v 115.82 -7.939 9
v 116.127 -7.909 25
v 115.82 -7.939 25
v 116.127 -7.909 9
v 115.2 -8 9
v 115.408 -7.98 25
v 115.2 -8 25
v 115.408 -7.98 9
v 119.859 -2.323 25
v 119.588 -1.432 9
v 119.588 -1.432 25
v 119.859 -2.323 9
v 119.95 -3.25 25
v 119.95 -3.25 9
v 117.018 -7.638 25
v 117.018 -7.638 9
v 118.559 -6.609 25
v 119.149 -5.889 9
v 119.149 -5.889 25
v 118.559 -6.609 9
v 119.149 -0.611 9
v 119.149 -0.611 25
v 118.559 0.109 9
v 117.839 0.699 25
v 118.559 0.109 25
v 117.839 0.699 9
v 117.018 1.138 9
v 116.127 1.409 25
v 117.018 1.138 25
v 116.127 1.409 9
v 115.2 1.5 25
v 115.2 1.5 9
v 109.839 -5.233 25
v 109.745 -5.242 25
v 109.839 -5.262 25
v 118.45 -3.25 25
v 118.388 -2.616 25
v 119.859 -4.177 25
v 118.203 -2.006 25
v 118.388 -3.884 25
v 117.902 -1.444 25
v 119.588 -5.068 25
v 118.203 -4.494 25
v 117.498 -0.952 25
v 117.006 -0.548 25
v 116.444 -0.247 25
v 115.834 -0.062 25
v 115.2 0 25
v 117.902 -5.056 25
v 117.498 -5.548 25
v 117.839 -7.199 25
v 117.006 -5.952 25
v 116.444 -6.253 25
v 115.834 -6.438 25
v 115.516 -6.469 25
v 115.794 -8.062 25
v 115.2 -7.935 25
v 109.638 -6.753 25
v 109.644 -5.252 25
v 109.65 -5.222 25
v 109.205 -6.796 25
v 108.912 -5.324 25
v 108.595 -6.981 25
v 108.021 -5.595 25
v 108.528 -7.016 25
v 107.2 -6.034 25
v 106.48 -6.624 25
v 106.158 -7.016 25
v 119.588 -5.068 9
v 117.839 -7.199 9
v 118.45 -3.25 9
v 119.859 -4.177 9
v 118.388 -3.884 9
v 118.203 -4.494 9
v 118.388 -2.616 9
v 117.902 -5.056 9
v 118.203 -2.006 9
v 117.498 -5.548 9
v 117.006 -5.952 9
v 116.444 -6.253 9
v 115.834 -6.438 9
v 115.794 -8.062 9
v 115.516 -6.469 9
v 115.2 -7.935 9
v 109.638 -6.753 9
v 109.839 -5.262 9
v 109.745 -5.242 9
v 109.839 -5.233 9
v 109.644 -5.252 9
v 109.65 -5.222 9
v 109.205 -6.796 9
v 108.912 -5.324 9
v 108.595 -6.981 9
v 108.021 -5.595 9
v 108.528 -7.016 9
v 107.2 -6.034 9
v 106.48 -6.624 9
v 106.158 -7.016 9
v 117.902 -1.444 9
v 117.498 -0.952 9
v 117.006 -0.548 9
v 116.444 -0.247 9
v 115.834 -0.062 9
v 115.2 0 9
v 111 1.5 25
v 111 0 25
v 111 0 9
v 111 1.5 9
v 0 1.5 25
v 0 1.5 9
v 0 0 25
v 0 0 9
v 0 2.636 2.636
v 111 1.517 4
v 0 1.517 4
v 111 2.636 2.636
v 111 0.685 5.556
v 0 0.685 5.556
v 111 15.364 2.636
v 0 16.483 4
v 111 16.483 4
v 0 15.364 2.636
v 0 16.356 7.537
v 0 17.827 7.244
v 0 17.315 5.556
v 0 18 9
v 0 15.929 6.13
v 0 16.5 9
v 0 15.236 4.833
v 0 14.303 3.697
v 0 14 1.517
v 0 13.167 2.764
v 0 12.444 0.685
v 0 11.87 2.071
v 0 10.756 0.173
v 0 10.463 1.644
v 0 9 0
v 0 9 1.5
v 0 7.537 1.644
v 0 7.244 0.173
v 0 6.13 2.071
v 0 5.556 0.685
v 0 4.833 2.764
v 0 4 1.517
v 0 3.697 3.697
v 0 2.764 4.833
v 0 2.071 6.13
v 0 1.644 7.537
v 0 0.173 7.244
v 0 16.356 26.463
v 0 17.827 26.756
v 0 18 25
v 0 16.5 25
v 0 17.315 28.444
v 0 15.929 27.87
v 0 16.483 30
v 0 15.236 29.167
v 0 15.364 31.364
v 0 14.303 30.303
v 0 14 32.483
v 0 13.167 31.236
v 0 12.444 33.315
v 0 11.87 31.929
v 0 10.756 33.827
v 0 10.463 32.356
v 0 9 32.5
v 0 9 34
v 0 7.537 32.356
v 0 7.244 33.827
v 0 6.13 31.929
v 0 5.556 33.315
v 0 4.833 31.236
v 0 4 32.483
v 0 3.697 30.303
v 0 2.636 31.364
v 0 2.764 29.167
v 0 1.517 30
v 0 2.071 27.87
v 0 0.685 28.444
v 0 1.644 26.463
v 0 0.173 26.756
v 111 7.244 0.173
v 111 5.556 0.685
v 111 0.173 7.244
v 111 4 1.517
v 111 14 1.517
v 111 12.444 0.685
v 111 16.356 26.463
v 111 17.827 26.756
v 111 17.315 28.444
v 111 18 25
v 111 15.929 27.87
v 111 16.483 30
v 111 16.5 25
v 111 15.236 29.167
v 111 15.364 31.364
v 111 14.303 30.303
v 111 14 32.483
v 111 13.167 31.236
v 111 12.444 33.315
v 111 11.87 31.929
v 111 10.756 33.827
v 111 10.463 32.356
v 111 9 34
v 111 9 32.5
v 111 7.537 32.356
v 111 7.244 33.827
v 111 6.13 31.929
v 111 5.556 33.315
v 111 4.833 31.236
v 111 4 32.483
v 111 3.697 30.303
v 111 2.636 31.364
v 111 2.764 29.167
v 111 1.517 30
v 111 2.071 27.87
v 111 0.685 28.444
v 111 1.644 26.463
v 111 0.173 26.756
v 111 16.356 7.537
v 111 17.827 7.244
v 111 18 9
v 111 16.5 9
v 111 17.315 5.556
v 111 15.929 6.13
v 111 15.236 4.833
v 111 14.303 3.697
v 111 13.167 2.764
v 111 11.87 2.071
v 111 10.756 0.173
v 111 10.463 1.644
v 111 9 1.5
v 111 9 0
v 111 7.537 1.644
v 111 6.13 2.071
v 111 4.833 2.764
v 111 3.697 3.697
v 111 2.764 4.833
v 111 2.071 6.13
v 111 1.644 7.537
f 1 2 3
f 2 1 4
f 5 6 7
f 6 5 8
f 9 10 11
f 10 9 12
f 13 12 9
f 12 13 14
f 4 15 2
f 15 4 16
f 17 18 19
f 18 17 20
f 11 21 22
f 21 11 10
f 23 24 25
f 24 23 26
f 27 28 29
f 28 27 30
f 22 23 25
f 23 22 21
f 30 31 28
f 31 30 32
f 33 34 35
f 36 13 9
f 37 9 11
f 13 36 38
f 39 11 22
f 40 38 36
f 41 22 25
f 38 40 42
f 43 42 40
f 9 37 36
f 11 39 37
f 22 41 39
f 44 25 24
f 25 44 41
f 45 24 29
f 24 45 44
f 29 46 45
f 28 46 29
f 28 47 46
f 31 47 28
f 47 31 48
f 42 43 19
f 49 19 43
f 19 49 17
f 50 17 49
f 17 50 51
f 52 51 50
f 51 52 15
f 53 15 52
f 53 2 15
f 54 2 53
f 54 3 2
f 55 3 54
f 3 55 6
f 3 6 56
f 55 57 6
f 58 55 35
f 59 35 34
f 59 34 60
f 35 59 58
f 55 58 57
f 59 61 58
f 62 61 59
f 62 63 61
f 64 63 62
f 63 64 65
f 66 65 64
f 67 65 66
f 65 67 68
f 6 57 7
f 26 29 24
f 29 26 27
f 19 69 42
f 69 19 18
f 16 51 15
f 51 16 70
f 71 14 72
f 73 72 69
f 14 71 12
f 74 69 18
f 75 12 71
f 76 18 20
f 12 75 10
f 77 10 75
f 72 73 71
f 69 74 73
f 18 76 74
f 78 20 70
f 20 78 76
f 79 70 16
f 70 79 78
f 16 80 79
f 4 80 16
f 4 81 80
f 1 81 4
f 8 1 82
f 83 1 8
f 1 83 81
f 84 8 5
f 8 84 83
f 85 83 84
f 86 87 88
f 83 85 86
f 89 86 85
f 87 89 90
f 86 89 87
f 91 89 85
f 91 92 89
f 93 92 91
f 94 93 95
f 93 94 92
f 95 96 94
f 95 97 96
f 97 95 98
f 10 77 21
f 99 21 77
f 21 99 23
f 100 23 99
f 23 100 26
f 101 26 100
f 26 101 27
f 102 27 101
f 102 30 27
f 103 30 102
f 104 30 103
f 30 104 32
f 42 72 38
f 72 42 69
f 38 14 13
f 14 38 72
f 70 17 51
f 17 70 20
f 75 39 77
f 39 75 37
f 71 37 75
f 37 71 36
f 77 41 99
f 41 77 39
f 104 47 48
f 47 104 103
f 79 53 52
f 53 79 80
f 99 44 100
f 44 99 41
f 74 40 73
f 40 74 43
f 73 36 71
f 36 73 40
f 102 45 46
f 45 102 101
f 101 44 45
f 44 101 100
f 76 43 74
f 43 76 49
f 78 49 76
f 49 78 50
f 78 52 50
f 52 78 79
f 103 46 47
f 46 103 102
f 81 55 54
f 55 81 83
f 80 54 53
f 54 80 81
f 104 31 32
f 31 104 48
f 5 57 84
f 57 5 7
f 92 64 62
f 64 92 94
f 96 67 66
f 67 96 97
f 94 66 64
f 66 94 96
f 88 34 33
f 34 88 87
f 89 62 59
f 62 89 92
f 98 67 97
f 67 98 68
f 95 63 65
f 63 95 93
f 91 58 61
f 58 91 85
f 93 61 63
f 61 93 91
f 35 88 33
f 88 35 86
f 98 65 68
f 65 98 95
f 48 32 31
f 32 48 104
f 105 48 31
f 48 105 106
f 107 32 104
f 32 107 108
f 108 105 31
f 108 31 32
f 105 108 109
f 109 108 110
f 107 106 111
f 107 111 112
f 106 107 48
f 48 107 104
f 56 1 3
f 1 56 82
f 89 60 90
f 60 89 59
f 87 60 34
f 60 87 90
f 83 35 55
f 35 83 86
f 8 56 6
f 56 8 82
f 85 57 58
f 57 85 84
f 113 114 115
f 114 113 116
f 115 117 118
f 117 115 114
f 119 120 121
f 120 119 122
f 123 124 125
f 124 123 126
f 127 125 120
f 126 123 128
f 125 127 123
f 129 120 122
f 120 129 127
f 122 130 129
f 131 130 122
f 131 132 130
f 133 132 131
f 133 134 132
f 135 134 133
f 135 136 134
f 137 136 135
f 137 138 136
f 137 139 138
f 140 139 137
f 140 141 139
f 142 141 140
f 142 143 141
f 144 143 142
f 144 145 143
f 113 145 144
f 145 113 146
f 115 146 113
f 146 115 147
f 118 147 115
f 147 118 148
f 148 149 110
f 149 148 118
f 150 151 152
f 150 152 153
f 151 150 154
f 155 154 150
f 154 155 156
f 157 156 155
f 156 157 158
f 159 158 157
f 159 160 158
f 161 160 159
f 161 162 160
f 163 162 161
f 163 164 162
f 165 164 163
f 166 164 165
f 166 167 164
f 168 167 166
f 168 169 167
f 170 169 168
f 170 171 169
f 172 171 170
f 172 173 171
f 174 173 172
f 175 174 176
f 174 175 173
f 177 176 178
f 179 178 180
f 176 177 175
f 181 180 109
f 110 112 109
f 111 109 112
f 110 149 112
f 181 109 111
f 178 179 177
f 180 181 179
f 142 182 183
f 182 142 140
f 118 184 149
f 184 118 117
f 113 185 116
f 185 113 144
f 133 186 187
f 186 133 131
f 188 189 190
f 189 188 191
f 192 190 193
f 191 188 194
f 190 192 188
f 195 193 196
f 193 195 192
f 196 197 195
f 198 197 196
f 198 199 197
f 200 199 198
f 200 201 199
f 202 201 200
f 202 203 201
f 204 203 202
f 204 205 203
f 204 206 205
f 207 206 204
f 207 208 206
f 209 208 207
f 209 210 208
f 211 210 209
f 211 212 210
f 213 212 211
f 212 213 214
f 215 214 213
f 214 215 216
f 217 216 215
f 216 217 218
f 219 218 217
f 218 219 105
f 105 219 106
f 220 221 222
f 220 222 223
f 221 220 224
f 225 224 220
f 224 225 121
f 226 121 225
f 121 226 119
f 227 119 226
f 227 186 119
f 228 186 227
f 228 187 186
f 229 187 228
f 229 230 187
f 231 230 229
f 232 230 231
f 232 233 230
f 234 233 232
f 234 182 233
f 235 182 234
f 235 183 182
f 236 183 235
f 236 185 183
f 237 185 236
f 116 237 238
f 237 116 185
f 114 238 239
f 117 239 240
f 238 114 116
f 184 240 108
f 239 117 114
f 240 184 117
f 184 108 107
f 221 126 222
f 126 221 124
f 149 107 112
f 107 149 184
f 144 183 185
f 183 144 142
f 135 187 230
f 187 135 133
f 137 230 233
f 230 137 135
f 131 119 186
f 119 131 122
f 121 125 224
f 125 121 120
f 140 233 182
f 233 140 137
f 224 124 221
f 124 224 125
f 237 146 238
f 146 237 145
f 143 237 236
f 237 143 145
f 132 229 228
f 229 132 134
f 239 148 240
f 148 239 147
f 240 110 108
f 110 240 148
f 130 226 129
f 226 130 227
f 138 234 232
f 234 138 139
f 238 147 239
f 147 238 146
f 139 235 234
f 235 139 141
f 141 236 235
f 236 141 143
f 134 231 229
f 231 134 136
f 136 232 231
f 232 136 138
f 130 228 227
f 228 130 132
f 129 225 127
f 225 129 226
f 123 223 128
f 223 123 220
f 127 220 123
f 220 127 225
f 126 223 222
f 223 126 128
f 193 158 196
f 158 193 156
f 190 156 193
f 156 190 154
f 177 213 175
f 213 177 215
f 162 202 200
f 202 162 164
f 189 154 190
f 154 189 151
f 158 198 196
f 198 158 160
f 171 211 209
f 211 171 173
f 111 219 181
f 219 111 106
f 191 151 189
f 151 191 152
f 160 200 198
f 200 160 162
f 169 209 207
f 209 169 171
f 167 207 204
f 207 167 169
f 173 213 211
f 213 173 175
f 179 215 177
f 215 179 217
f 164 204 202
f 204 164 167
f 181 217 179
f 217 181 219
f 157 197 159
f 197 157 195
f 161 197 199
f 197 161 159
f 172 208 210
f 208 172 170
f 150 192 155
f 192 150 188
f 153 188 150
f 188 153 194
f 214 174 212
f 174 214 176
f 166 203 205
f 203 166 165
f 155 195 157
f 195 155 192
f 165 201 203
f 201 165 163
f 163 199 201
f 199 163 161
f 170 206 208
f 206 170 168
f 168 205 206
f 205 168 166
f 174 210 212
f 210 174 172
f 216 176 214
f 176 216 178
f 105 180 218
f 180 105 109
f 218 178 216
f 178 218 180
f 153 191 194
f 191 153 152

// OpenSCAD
module clip(opening=6.2, width=10, cliplen=6.6, thickness=1.5) {
    union() {
        // back piece
        translate([-cliplen, 0, 0])
        cube([cliplen*3, thickness, width]);
        // curve at back
        translate([cliplen*2, -opening/2, width/2]) {
            difference() {
                cylinder(h=width, d=opening+2*thickness, center=true, $fn=32);
                cylinder(h=width, d=opening, center=true, $fn=32);
                translate([-cliplen/2, 0, 0])
                cube([cliplen, opening+2*thickness, width], center=true);
            }
        }
        // front
        rot_angle = 12;
        offset_x = cos(rot_angle)*(cliplen/2);
        offset_y = -sin(rot_angle)*(cliplen/2-thickness/4);
        echo("offset_x=", offset_x, ", offset_y=", offset_y);
        translate([
            (cliplen*2)-offset_x+thickness/2,
            -(opening+offset_y+thickness/2),
            width/2]) {
            rotate([0, 0, -rot_angle]) {
                cube([cliplen, thickness, width], center=true);
            }
        }
        // rounding on end
        translate([
            cliplen+offset_x/2-thickness/4,
            -opening*1.5+offset_y+thickness/4,
            width/2]) {
            difference() {
                cylinder(h=width, d=opening+2*thickness, center=true, $fn=32);
                cylinder(h=width, d=opening, center=true, $fn=32);
                translate([cliplen/2, 0, 0])
                cube([cliplen, opening+2*thickness, width], center=true);
                translate([-cliplen/2, -opening/6, 0])
                cube([cliplen, cliplen+thickness, width], center=true);
            }
        }
    }
}

module drive_holder(length=111, width=31, depth=15, thickness=1.5) {
    // back piece
    translate([0, 0, depth/2+thickness])
        cube([length, thickness, width-depth]);
    // curved edge
    module edge() {
        difference() {
            cylinder(h=length, d=(depth+thickness*2), center=true, $fn=32);
            cylinder(h=length, d=depth, center=true, $fn=32);
            translate([depth/2+thickness, 0, 0])
                cube([depth+thickness*2, depth+thickness*2, length], center=true);
        }
    }
    // bottom curve
    translate([length/2, depth/2+thickness, depth/2+thickness])
        rotate([0, 90, 0])
        rotate([0, 0, 180])
        edge();
    // top curve
    translate([length/2, depth/2+thickness, width-depth/2+thickness])
        rotate([0, 90, 0])
        edge();
}

translate([102, 0, 9])
    clip(opening=6.5, width=16);
drive_holder();
